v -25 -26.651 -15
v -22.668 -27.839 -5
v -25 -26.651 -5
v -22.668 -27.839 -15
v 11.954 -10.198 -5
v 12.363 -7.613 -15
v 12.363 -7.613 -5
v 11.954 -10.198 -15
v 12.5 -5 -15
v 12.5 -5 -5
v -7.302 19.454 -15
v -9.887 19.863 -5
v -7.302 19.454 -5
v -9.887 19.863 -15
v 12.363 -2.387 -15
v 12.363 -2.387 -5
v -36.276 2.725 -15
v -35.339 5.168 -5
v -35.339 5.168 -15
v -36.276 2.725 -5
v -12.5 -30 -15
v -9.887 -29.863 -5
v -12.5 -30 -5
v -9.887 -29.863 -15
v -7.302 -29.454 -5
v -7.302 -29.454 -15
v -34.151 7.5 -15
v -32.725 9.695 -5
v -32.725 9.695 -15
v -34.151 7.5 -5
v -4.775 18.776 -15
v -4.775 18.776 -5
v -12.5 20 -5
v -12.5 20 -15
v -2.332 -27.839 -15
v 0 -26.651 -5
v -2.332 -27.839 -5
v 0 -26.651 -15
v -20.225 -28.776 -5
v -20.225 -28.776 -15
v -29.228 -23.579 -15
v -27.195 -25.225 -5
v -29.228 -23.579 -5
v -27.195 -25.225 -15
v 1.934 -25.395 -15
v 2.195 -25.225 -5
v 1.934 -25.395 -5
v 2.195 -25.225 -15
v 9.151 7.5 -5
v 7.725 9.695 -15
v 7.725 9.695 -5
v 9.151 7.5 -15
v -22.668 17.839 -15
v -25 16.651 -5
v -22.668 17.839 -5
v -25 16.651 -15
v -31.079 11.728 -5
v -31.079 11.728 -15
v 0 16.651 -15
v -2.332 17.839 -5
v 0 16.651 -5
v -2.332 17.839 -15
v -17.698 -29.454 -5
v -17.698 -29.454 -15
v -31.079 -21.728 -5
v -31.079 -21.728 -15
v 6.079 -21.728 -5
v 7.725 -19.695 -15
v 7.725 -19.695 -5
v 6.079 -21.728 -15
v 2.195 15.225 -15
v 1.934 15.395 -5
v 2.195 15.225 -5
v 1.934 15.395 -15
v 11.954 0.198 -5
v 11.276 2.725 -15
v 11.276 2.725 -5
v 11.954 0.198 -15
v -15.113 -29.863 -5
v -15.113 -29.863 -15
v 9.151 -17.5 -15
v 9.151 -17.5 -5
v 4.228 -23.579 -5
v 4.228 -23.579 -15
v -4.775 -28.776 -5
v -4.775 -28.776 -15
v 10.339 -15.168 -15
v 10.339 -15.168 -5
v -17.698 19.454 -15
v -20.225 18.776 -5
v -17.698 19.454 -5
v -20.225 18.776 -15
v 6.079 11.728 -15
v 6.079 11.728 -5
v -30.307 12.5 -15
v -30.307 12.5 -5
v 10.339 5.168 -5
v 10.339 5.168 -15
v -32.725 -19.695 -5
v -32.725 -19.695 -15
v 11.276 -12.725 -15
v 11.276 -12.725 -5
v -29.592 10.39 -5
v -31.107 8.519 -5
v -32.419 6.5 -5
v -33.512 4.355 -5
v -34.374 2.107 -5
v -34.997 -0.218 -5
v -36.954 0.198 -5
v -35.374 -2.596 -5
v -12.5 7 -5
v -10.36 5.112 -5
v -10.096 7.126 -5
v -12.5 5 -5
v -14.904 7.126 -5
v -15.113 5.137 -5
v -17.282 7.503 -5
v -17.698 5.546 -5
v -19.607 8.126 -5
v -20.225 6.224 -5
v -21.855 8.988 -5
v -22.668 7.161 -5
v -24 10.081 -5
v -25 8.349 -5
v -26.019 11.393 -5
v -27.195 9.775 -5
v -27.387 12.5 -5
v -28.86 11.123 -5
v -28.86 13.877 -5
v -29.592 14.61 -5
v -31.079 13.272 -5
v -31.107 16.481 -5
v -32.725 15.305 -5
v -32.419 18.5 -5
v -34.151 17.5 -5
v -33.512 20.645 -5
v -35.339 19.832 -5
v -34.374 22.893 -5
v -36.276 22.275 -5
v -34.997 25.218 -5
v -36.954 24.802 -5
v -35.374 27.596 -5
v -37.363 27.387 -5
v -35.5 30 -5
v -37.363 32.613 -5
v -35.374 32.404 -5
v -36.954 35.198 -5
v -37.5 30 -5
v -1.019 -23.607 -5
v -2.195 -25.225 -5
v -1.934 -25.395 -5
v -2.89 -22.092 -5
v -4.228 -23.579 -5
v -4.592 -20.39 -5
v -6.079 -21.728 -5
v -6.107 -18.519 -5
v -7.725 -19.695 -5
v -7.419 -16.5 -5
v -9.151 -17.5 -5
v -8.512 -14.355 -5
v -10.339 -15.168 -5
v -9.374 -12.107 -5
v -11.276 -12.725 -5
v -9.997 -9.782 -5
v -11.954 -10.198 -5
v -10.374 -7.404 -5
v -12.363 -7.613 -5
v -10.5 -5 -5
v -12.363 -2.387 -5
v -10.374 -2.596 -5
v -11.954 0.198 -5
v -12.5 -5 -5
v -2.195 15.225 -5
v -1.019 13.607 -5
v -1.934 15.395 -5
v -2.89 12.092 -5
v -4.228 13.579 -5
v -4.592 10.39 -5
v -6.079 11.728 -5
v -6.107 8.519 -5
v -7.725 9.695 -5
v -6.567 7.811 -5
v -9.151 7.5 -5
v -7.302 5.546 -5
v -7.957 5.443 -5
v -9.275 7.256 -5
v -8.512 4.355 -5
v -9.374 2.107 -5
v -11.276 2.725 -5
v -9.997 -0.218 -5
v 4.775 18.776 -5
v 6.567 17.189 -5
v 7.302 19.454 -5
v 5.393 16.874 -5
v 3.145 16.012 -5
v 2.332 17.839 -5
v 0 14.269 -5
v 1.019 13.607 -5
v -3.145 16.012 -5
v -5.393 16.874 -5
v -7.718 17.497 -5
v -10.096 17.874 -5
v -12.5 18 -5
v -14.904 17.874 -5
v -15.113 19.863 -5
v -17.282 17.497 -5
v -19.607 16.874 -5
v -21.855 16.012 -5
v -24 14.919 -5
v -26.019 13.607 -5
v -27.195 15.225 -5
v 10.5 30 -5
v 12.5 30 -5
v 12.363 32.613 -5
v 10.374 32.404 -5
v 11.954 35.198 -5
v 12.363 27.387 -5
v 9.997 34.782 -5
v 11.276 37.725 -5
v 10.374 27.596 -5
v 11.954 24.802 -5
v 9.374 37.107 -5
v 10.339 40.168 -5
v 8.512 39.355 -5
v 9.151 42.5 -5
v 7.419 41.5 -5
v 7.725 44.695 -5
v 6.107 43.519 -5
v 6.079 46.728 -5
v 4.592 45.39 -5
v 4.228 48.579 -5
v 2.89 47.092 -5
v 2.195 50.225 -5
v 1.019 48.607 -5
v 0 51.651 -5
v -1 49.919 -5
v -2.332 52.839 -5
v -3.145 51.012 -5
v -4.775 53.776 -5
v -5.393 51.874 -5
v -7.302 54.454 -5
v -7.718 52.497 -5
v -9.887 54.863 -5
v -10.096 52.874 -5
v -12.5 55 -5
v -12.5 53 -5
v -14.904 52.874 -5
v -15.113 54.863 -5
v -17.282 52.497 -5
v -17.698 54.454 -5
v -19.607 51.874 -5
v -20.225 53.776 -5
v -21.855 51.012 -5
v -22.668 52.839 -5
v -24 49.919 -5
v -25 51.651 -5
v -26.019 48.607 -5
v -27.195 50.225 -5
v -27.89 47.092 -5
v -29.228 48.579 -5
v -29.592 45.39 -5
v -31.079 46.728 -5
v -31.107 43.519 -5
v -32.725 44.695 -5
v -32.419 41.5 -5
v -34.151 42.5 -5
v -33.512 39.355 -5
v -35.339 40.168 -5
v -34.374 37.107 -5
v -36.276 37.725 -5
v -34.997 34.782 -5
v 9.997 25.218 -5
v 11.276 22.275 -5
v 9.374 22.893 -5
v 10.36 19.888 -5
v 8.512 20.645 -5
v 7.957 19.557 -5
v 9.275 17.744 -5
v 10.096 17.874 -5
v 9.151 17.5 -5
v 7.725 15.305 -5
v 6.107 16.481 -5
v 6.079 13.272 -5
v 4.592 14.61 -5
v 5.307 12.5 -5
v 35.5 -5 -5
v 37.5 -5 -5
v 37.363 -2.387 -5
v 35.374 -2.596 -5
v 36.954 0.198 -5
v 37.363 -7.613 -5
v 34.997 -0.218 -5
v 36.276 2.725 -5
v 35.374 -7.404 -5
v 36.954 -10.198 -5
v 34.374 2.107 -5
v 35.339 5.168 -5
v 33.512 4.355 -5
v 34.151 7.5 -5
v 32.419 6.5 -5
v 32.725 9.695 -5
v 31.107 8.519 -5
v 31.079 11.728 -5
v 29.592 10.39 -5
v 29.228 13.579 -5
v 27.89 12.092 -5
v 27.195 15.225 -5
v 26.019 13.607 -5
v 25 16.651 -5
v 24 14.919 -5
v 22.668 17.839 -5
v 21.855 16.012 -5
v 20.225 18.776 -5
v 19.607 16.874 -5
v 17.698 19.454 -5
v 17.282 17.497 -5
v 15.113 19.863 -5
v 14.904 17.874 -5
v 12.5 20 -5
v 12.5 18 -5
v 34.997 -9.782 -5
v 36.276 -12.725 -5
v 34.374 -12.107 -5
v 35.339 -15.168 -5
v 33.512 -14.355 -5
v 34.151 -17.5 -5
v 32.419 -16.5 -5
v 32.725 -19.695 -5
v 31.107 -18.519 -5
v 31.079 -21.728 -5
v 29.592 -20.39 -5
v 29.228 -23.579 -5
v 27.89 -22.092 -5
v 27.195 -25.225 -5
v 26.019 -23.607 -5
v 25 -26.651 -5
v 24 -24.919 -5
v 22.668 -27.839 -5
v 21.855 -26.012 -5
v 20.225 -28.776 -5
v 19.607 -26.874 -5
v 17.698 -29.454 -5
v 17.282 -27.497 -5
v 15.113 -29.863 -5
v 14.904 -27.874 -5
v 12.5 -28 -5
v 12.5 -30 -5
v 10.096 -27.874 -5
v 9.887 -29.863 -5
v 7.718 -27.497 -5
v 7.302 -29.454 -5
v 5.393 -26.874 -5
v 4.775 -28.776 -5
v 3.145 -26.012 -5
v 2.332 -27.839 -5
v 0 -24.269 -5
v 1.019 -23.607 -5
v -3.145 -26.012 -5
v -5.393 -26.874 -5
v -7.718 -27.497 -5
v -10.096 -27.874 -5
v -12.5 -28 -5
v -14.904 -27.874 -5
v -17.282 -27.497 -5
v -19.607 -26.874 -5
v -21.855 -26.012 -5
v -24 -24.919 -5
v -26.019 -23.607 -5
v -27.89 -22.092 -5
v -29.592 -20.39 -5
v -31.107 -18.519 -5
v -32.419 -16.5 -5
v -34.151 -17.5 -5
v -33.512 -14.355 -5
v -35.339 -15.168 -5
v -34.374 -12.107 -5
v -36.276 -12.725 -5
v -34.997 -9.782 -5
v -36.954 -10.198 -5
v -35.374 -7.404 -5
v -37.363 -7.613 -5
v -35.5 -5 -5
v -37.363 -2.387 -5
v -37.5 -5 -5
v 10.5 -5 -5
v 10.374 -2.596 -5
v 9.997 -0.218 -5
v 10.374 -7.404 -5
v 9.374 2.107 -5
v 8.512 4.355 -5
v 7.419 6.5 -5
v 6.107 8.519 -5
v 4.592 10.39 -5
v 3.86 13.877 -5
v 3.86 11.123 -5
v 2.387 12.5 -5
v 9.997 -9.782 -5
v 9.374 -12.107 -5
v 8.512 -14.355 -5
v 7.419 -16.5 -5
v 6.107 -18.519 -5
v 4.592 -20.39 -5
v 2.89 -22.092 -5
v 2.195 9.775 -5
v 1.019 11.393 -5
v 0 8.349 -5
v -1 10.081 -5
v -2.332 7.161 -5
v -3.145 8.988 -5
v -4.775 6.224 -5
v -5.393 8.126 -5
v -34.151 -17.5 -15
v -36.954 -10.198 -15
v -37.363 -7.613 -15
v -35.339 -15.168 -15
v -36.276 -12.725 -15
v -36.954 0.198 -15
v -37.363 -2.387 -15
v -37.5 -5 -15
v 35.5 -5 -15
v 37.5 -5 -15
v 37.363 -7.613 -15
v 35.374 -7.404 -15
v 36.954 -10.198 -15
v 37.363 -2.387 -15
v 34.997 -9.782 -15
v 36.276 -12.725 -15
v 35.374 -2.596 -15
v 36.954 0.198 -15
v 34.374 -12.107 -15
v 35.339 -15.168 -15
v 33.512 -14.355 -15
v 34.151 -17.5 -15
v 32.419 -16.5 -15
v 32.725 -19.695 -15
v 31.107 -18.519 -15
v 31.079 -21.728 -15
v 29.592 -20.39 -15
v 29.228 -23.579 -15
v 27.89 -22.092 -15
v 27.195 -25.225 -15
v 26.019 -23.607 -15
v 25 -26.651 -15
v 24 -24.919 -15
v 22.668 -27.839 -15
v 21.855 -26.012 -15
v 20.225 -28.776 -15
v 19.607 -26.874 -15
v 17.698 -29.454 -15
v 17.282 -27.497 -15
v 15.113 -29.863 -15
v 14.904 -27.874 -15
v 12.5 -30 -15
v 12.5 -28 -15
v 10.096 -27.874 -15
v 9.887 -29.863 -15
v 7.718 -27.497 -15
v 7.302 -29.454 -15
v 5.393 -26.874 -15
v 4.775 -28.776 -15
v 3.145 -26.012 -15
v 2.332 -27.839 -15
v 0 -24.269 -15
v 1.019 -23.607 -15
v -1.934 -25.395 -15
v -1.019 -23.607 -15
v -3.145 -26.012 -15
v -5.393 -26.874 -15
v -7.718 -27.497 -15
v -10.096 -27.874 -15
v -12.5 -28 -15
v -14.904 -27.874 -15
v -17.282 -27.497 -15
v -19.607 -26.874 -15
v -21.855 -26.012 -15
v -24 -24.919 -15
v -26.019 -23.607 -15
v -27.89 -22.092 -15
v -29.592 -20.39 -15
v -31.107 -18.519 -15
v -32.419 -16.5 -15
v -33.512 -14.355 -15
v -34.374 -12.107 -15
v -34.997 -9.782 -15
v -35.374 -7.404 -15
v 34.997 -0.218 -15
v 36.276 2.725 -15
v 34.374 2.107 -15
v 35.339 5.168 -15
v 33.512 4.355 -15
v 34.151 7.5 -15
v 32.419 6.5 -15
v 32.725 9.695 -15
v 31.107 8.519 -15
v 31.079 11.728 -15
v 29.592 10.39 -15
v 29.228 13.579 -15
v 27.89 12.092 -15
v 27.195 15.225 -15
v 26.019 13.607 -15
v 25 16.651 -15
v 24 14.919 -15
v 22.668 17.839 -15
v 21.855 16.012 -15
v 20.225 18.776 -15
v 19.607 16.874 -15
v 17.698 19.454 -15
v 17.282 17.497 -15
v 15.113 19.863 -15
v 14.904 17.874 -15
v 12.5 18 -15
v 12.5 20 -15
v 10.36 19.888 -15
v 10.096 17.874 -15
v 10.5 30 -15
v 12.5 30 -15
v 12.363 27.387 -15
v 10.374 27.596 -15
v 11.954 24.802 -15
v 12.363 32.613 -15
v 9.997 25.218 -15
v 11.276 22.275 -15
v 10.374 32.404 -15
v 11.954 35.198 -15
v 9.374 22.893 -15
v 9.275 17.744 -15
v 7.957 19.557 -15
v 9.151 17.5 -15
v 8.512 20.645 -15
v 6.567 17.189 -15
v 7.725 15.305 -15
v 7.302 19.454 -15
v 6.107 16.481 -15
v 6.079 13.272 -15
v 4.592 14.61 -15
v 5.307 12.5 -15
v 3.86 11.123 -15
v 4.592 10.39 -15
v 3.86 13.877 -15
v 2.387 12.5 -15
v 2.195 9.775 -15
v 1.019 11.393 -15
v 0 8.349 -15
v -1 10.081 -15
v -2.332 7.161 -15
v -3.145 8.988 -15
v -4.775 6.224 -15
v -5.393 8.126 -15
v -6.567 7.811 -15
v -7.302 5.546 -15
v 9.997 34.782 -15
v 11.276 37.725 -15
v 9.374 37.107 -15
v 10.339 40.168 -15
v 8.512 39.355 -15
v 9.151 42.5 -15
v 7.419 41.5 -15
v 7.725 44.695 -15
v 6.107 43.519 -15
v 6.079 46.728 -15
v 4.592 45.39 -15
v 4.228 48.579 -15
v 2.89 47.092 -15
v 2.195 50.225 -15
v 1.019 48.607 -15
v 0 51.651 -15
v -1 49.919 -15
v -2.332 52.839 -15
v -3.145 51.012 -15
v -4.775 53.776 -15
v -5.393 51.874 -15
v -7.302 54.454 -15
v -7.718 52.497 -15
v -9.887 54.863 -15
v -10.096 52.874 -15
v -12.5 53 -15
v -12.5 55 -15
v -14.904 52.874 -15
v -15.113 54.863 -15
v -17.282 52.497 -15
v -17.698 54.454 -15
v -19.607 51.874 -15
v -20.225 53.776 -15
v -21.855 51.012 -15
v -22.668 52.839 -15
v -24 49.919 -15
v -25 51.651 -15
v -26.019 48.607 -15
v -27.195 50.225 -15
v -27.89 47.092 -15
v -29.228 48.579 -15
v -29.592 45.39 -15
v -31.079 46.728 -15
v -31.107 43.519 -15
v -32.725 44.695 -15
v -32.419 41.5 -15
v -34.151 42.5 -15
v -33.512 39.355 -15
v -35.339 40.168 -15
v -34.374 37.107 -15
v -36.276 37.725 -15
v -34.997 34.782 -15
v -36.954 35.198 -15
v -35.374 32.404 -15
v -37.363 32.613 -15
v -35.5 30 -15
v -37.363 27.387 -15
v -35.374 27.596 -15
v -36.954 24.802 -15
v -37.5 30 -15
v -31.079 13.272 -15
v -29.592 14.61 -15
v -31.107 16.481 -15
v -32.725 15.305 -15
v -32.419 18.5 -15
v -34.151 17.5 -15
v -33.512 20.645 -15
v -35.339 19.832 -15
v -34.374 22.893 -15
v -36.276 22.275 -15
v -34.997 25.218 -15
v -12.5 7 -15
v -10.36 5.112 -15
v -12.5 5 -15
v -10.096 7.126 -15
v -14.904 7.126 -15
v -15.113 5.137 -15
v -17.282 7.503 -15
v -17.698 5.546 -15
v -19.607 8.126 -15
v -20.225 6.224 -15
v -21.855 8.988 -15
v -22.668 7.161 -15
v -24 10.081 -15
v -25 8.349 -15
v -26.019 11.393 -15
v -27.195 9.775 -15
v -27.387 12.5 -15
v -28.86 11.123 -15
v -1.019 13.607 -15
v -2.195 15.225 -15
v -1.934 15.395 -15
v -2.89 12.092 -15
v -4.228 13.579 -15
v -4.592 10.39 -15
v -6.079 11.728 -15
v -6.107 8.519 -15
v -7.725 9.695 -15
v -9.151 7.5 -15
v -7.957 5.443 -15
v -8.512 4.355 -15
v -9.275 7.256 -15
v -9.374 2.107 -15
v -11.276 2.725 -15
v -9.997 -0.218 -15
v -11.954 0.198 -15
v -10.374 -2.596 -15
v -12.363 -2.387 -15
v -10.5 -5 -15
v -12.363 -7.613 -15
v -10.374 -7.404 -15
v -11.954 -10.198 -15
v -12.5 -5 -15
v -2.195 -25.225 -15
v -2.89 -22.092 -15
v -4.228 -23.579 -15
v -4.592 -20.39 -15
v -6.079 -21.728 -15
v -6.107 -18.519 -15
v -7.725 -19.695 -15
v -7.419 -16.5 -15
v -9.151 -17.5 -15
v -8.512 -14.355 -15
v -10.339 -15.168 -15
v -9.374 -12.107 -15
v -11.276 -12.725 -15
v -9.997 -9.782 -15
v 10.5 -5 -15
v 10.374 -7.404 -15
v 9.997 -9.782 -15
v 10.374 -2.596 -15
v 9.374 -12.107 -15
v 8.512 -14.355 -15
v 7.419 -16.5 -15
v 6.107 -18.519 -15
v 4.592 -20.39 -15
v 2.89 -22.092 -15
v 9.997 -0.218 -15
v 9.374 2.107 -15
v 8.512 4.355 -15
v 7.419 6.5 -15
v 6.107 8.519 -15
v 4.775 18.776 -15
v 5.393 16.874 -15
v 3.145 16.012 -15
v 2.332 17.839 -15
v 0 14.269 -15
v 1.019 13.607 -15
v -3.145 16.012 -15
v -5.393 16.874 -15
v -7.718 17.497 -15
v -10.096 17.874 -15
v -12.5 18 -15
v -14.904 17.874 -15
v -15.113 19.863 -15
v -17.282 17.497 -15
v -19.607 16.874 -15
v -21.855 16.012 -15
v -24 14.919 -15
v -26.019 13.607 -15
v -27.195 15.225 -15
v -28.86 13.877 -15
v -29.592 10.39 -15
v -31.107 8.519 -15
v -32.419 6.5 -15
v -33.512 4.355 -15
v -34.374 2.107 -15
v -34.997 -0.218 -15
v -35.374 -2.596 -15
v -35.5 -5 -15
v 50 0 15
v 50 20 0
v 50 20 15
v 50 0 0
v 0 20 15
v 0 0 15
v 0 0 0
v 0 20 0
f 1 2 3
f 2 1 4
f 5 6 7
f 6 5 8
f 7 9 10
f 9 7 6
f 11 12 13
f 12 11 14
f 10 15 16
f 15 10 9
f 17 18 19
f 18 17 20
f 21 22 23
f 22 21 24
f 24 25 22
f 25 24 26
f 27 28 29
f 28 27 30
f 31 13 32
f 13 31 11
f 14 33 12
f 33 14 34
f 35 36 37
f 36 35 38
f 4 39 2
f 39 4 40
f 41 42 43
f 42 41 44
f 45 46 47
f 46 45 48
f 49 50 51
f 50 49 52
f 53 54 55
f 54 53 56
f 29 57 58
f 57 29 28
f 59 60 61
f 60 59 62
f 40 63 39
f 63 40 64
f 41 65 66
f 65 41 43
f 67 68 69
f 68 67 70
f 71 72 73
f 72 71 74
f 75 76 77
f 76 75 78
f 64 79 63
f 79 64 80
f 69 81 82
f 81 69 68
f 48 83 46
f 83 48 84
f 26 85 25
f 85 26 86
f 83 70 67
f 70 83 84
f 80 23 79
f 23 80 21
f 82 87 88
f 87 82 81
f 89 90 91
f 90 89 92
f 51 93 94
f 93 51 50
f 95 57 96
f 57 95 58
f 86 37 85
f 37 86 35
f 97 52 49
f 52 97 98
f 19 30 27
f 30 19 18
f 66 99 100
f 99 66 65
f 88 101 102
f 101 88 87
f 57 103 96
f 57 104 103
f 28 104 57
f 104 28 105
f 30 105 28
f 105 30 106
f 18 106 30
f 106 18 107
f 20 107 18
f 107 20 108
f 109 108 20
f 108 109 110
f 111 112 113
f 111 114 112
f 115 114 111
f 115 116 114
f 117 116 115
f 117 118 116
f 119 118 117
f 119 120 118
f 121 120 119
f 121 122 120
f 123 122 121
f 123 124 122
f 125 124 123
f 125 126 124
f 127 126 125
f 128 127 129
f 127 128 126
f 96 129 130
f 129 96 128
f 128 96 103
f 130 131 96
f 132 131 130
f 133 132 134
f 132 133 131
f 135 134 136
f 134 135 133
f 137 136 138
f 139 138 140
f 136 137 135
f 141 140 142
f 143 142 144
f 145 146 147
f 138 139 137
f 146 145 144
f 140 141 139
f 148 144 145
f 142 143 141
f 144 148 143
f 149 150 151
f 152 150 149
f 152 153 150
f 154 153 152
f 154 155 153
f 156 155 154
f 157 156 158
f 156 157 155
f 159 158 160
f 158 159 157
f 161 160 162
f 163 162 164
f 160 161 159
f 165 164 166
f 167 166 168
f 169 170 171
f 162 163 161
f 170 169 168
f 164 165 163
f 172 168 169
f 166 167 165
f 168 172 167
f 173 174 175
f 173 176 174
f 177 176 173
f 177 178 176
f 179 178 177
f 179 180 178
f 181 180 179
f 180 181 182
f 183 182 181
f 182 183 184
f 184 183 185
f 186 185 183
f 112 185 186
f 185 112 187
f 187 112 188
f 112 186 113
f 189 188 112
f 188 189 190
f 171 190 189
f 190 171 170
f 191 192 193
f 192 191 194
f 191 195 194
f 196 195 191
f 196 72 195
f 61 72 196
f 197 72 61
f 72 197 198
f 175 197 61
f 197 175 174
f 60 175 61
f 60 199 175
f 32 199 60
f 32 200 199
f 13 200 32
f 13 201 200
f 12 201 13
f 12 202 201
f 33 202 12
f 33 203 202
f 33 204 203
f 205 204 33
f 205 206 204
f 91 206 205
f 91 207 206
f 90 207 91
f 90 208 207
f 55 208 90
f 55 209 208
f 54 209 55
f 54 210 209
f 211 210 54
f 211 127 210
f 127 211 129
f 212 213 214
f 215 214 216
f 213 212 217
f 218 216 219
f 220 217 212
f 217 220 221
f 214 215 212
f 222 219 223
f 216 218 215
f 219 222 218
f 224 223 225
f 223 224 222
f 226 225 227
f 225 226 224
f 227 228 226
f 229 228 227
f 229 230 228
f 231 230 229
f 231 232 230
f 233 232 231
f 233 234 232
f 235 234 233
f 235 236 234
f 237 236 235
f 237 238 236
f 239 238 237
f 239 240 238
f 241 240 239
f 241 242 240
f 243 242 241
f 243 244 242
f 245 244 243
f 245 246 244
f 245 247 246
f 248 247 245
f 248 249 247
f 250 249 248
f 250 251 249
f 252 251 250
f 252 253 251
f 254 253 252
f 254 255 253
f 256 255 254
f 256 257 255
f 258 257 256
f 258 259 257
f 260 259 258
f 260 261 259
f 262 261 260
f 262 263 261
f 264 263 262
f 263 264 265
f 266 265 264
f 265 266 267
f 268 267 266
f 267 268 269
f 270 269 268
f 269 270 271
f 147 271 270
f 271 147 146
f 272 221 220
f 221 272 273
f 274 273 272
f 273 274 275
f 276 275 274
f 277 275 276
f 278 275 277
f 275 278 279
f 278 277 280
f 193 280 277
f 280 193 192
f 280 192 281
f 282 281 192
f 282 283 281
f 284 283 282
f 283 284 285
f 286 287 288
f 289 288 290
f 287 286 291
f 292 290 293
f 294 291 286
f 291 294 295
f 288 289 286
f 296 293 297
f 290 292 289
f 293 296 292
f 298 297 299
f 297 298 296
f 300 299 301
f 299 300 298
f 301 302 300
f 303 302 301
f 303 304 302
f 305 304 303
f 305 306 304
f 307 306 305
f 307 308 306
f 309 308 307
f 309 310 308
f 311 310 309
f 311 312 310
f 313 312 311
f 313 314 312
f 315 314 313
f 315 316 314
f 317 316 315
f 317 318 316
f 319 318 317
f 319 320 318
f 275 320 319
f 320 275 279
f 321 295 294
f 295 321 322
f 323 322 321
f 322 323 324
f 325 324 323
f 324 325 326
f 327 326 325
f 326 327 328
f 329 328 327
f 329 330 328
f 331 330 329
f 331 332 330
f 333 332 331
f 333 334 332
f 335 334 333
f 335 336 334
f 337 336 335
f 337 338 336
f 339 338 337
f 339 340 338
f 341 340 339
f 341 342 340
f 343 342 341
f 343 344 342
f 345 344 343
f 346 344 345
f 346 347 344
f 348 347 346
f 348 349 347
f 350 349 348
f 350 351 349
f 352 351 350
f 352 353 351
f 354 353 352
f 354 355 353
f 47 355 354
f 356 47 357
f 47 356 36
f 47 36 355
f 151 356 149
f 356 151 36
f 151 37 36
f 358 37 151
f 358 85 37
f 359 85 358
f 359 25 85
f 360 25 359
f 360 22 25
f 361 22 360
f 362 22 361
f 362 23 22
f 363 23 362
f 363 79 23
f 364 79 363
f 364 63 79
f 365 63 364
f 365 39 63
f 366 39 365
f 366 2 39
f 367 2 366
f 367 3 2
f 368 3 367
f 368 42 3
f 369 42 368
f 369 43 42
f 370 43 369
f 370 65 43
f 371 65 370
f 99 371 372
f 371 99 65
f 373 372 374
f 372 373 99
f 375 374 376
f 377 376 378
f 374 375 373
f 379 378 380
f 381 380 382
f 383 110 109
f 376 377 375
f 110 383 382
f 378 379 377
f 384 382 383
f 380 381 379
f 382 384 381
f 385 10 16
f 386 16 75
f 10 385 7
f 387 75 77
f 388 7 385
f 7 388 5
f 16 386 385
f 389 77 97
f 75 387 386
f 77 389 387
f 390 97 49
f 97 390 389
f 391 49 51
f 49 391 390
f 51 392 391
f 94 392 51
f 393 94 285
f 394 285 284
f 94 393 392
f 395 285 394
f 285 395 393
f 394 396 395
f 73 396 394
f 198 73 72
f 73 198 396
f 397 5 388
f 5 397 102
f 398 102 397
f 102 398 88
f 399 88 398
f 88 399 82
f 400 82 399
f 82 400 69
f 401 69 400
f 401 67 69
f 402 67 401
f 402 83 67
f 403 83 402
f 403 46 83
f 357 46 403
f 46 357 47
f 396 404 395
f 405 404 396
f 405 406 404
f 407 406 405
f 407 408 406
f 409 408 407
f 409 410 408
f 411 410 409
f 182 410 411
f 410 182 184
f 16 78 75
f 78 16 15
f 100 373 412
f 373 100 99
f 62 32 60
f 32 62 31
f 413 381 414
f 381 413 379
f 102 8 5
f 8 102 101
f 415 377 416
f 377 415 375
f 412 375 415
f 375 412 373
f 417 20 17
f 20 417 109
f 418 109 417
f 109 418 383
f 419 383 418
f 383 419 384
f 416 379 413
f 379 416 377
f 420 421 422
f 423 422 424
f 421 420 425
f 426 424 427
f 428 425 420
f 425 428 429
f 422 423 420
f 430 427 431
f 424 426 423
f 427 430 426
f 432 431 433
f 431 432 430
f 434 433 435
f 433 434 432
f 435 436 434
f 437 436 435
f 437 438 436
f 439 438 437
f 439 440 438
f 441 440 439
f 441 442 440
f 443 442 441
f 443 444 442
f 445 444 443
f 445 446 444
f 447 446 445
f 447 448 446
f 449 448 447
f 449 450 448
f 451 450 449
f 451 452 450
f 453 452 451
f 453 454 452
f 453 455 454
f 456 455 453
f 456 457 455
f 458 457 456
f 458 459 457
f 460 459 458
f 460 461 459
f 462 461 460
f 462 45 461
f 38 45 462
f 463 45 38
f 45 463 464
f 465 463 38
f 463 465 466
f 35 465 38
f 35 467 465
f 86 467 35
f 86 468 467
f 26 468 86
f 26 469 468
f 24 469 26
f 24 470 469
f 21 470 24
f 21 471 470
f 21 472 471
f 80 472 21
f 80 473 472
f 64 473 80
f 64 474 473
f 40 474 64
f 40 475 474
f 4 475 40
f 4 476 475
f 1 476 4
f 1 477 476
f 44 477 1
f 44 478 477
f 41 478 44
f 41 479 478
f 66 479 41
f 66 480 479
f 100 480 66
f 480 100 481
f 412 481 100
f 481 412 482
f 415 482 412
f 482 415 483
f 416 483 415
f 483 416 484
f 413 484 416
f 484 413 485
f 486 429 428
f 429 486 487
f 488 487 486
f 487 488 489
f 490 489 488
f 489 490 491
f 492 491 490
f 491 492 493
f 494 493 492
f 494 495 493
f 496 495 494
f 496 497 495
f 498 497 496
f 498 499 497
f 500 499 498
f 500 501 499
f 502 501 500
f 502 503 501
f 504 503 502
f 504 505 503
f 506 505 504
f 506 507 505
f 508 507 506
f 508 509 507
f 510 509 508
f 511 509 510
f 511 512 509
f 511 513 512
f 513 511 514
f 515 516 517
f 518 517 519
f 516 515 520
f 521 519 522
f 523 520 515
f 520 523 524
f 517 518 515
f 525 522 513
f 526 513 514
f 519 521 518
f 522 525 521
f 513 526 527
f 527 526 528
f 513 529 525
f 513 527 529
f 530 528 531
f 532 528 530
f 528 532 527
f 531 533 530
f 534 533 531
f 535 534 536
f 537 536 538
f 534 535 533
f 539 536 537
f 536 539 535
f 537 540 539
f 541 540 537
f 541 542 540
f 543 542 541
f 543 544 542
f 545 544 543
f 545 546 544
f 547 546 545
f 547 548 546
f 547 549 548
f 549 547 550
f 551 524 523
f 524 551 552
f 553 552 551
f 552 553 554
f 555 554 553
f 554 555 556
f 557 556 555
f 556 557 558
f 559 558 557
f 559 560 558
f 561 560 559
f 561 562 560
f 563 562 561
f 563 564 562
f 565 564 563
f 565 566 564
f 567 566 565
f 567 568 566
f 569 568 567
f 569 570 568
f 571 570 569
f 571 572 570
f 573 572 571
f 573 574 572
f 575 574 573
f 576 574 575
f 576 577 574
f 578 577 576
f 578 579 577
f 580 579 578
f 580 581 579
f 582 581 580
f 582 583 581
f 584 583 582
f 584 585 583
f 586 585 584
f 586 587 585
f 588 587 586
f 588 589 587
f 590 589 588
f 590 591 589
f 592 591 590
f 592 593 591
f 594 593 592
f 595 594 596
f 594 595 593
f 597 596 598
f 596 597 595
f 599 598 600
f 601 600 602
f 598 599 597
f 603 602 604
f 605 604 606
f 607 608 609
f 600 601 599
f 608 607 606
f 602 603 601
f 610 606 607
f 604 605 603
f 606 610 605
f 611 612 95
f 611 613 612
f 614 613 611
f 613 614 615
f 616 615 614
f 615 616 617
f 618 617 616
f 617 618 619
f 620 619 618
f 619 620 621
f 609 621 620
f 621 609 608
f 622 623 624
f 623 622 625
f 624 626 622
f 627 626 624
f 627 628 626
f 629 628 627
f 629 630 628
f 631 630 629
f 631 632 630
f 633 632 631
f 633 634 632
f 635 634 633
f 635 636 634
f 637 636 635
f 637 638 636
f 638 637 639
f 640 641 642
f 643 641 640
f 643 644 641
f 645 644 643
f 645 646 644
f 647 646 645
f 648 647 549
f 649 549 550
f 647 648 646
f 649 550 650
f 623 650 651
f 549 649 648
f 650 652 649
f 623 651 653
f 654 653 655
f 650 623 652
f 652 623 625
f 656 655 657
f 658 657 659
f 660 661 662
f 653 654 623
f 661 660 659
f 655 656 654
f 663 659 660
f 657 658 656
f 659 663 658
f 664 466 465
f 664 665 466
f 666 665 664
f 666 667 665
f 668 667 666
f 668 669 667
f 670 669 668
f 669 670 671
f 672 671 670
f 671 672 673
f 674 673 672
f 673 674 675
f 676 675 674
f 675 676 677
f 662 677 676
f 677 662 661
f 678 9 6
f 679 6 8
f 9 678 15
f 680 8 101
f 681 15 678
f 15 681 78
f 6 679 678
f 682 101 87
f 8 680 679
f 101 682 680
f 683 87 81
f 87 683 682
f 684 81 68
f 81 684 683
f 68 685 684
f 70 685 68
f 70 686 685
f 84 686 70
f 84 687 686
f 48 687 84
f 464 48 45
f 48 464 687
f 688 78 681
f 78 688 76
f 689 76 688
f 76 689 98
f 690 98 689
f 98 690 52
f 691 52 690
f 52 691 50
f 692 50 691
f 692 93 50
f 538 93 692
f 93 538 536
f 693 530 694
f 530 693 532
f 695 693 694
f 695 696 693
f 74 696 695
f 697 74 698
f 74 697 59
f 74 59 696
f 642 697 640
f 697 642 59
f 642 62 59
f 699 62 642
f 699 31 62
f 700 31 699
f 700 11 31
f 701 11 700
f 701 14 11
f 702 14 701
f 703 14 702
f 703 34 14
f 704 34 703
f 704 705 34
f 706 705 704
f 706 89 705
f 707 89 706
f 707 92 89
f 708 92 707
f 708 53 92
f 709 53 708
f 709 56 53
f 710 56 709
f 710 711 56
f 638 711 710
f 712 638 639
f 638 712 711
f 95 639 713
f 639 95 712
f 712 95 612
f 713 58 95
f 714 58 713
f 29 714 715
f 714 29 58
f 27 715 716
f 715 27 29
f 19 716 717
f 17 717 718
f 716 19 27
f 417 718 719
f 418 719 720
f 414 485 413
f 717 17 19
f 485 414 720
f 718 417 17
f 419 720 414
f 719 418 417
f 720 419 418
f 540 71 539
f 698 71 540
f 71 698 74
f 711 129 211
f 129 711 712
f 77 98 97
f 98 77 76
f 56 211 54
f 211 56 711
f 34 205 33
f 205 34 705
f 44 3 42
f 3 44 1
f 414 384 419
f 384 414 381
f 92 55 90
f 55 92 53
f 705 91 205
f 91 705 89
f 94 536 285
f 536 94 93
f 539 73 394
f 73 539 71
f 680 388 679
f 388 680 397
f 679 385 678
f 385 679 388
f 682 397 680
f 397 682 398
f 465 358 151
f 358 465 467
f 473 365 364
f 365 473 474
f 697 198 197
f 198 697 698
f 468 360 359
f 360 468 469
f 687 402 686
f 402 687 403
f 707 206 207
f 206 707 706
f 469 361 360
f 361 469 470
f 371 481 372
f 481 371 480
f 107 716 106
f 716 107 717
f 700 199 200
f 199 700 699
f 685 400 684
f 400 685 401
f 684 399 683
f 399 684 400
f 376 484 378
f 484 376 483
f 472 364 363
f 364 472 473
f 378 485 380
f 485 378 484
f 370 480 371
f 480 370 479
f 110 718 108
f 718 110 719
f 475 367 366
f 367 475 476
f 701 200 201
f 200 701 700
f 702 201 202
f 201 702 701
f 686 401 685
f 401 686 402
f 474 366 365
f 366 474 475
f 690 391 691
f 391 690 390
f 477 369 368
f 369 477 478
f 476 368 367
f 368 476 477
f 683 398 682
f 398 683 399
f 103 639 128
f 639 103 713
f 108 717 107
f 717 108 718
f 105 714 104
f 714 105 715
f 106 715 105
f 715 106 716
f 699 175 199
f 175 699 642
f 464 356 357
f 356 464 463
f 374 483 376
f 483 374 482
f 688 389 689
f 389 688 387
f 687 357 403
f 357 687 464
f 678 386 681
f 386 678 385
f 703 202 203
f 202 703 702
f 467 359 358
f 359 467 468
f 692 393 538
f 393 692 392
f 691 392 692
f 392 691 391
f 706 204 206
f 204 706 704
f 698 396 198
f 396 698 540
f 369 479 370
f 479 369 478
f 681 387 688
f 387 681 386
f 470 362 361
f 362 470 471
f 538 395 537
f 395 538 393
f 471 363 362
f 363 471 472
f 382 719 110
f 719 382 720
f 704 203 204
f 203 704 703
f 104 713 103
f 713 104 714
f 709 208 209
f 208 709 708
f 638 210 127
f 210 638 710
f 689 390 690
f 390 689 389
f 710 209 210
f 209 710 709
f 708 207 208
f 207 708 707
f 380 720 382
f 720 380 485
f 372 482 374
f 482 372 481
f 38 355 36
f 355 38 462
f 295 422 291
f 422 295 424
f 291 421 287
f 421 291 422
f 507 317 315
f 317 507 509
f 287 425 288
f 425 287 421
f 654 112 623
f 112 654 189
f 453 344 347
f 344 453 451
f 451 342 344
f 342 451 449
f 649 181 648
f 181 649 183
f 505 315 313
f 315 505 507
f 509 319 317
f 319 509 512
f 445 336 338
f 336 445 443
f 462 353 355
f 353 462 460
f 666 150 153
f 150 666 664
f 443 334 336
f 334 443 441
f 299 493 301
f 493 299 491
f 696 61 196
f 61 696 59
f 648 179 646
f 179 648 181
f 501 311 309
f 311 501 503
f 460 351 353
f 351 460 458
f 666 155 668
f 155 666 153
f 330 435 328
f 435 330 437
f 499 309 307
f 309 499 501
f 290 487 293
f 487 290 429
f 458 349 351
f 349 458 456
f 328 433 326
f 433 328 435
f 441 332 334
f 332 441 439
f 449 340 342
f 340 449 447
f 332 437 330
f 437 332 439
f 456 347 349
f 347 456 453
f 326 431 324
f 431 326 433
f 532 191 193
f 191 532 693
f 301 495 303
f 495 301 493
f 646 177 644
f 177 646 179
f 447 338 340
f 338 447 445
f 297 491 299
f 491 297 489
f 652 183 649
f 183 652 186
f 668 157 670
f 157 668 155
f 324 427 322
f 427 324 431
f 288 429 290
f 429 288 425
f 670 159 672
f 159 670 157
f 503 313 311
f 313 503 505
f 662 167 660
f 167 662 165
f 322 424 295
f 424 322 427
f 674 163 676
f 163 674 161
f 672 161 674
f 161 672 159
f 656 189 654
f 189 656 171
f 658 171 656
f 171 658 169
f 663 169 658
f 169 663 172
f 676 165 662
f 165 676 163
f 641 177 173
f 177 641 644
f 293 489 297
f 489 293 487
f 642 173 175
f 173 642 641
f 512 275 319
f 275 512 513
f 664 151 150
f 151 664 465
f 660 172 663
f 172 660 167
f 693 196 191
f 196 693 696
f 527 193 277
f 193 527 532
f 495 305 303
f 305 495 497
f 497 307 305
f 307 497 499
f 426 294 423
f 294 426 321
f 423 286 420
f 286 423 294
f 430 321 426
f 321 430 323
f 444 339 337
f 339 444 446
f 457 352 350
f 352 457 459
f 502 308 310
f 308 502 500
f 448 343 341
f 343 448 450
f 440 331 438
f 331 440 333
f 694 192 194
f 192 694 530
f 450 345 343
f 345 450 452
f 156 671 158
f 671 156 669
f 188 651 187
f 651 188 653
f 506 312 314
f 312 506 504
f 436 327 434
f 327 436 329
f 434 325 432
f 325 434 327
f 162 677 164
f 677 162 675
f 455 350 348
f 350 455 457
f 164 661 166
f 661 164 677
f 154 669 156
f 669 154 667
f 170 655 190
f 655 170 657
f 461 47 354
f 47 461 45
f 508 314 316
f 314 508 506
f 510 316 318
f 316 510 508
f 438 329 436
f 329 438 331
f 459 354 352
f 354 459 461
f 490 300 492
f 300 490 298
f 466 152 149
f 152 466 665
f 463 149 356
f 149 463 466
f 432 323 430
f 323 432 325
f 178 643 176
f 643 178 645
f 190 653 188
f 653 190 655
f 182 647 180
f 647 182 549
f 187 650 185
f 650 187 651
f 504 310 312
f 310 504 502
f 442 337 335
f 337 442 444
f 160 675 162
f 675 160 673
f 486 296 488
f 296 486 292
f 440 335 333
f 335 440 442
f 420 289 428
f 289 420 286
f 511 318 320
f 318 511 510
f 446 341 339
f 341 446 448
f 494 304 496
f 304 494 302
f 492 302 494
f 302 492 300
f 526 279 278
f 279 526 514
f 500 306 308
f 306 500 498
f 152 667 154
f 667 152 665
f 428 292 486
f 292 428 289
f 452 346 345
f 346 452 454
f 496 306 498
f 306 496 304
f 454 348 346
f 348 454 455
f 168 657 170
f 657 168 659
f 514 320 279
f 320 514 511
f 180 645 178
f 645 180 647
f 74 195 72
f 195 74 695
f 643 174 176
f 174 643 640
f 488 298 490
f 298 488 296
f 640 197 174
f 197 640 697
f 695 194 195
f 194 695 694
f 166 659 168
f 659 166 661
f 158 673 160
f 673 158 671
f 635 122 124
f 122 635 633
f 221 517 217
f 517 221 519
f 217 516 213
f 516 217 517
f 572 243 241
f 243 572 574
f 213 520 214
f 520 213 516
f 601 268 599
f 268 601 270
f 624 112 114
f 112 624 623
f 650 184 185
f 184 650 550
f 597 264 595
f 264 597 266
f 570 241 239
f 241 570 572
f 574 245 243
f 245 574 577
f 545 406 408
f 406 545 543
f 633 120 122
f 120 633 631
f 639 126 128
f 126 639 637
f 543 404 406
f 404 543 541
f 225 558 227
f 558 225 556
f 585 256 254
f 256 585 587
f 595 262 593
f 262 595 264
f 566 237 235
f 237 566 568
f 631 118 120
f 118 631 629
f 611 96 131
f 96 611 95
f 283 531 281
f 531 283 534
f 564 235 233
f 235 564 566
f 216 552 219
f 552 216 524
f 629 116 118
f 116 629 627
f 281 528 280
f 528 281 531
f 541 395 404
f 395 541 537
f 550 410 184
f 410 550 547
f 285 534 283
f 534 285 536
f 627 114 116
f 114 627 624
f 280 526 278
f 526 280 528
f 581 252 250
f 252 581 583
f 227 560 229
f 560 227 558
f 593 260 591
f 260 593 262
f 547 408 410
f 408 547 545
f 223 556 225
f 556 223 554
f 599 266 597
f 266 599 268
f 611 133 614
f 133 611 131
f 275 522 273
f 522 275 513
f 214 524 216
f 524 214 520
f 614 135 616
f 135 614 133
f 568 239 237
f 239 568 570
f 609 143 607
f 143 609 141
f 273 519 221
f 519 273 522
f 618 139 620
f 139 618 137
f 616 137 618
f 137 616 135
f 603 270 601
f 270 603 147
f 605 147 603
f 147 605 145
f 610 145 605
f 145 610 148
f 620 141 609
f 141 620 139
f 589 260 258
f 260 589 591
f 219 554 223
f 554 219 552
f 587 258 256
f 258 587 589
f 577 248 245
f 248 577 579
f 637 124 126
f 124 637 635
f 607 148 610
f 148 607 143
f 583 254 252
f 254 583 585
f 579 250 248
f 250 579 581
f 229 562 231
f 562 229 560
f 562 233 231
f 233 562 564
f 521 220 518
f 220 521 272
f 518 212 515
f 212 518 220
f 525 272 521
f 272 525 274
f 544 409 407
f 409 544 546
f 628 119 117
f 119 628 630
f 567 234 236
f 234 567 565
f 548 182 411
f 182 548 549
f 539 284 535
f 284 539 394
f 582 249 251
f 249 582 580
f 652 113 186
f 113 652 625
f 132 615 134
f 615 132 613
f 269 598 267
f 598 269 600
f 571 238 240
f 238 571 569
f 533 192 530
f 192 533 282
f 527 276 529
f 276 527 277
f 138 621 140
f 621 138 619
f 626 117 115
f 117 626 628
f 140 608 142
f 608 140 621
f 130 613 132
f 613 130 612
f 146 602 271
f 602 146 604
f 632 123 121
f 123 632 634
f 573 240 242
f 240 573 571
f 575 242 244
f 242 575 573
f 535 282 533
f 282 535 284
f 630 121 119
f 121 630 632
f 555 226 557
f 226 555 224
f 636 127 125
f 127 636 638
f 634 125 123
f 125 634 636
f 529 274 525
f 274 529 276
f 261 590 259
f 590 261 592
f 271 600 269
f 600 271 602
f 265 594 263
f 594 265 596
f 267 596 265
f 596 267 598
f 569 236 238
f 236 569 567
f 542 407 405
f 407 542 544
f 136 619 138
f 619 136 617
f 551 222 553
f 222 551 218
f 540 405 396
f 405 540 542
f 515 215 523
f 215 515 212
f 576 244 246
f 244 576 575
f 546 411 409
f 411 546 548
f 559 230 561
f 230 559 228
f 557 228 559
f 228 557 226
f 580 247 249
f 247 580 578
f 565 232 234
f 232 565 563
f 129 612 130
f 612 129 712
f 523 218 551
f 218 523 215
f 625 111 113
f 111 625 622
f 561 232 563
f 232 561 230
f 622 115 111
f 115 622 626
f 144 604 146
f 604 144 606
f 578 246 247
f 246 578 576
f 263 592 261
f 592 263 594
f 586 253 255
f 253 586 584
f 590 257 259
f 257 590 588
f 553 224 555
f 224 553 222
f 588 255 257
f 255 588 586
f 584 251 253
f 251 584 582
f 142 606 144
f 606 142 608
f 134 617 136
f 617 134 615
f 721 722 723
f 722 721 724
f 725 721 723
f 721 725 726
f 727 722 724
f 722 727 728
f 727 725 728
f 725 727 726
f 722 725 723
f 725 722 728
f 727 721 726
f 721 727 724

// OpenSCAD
// Generated by CadMonkey
// Prompt: hey cadmonkey, create me a car
// Generated at: 2025-11-10 21:30:24

// Car Model - Simplified

$fn = 60;

module wheel(radius, width) {
    difference() {
        cylinder(r=radius, h=width);
        translate([0,0,-1]) cylinder(r=radius-2, h=width+2);
    }
}

module car_body(length, width, height) {
    cube([length, width, height]);
}


module car_wheel(radius, width) {
    rotate([90,0,0])
    translate([-radius/2, -width/2, 0])
    wheel(radius, width);
}



module car_body(length, width, height) {
    cube([length, width, height]);
}




module car(length, width, height, wheel_radius, wheel_width) {

    // Body
    car_body(length, width, height);

    // Wheels
    translate([0, -width/2, -wheel_width/2])
    rotate([90, 0, 0])
    car_wheel(wheel_radius, wheel_width);

    translate([length/2, -width/2, -wheel_width/2])
    rotate([90, 0, 0])
    car_wheel(wheel_radius, wheel_width);
    
    translate([0, length/2, -wheel_width/2])
    rotate([90, 0, 0])
    car_wheel(wheel_radius, wheel_width);


     translate([0, -width/2, -wheel_width/2])
    rotate([90, 0, 0])
    car_wheel(wheel_radius, wheel_width);



}

car(50,20,15,25,10);
